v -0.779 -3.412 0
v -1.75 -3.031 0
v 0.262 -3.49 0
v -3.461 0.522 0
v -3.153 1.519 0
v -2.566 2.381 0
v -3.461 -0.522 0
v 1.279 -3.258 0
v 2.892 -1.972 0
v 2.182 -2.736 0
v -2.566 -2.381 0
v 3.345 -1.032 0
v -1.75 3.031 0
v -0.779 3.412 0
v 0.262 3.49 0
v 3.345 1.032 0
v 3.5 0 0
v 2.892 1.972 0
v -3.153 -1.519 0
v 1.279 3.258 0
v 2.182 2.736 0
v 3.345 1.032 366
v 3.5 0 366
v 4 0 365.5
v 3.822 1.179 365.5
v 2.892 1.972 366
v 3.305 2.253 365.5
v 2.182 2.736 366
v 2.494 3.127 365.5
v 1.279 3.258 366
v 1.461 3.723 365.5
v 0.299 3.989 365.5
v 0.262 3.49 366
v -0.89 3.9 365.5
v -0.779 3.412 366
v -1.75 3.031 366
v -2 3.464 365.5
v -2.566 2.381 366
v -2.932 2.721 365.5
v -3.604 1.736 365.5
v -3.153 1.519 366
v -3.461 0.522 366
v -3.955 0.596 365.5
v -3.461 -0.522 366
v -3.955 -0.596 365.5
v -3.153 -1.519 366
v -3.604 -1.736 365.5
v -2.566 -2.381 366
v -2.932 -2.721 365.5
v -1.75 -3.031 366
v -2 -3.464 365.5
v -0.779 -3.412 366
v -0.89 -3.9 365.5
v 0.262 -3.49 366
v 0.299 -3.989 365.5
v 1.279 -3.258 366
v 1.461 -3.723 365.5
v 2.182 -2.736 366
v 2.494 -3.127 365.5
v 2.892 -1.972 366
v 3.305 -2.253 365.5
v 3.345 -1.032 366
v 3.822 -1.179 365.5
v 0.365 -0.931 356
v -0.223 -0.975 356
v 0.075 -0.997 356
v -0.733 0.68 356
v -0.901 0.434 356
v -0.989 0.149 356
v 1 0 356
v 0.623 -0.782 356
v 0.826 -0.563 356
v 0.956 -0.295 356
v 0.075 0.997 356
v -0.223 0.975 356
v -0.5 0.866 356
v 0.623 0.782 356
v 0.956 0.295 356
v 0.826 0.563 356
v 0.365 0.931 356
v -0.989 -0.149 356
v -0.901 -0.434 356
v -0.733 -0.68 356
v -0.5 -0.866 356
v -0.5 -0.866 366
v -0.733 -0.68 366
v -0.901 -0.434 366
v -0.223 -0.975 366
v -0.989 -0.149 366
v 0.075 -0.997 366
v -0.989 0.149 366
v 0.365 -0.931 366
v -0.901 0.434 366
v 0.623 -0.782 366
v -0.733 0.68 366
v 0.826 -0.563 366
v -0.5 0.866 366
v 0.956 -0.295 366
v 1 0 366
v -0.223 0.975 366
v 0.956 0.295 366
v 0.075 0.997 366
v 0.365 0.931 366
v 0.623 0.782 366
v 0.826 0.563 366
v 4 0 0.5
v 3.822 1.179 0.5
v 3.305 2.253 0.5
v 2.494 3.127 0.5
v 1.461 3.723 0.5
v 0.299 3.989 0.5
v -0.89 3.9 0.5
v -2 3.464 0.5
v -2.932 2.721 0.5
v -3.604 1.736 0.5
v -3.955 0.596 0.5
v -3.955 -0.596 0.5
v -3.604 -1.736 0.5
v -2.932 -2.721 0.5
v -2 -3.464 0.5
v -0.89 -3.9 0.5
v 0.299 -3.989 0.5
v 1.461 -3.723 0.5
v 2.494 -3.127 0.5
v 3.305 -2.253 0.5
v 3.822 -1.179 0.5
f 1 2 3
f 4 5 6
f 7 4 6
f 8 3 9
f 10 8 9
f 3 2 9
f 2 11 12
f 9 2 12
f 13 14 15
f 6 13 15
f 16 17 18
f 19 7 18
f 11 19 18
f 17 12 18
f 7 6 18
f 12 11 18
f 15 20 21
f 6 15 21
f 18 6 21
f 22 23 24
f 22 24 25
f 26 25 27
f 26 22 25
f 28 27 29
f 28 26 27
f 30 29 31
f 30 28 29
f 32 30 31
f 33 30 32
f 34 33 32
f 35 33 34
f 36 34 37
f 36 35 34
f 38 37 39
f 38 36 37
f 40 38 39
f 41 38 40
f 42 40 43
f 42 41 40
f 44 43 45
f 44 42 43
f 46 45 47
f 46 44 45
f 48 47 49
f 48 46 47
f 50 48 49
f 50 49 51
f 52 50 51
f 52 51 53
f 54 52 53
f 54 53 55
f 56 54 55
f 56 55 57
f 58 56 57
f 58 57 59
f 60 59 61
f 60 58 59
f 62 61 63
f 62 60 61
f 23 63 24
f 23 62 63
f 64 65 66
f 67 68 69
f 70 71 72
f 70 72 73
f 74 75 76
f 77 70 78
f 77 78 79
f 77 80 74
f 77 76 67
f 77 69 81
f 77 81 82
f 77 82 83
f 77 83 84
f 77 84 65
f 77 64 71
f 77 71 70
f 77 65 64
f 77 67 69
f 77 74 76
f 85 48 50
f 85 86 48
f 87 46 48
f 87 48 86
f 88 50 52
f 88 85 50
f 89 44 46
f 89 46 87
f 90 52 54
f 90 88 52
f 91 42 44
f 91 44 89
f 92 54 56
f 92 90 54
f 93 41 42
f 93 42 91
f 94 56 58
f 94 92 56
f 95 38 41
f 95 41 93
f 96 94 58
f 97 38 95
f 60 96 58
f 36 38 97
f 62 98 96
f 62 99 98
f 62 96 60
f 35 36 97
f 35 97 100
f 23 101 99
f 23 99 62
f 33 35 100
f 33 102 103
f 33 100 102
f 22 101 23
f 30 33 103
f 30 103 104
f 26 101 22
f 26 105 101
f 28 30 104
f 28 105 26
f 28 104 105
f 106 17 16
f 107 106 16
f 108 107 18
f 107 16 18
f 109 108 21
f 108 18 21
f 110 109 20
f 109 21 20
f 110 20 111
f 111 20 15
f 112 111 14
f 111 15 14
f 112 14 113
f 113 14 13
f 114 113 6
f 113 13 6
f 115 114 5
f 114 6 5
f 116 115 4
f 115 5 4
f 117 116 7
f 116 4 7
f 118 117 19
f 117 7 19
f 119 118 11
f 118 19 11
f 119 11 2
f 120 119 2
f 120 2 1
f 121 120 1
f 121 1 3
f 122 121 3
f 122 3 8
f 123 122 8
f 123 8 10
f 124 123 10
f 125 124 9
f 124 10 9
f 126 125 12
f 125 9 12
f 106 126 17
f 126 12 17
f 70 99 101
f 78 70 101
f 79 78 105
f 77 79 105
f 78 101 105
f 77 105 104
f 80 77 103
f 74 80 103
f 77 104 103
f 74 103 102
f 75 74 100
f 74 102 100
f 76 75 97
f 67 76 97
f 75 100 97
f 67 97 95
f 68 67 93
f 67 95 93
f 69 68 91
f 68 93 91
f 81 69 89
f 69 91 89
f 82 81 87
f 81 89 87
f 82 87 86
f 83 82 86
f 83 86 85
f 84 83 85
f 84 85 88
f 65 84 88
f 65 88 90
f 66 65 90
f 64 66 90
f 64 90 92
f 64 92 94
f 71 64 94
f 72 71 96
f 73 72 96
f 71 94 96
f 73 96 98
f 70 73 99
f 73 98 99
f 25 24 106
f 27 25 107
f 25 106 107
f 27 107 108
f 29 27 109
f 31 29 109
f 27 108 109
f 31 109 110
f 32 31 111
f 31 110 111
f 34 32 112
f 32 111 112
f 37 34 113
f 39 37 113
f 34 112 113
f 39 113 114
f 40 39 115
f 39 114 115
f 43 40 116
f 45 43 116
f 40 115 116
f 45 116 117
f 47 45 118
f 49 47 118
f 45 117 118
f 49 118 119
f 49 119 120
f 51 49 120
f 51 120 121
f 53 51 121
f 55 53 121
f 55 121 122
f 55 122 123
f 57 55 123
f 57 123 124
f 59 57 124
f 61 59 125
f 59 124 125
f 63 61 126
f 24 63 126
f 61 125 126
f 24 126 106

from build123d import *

# Parameters (mm, degrees)
SKETCH1_R           = 4
BOSS_EXTRUDE1_DEPTH = 366
SKETCH2_R           = 1
CUT_EXTRUDE1_DEPTH  = 10
CHAMFER1_SIZE       = 0.5


with BuildPart() as part:
    # Sketch1 → Boss-Extrude1 (new body)
    with BuildSketch(Plane.XY):
        Circle(SKETCH1_R)
    extrude(amount=BOSS_EXTRUDE1_DEPTH)

    # Sketch2 → Cut-Extrude1 (cut)
    with BuildSketch(Plane.XY.offset(366)):
        Circle(SKETCH2_R)
    extrude(amount=-CUT_EXTRUDE1_DEPTH, mode=Mode.SUBTRACT)

    # Chamfer1
    chamfer1_edges = [part.edges().sort_by_distance(p)[0] for p in [
        (-4, 0, 0),
        (-4, 0, 366),
    ]]
    chamfer(chamfer1_edges, length=CHAMFER1_SIZE)


solid = part.part
